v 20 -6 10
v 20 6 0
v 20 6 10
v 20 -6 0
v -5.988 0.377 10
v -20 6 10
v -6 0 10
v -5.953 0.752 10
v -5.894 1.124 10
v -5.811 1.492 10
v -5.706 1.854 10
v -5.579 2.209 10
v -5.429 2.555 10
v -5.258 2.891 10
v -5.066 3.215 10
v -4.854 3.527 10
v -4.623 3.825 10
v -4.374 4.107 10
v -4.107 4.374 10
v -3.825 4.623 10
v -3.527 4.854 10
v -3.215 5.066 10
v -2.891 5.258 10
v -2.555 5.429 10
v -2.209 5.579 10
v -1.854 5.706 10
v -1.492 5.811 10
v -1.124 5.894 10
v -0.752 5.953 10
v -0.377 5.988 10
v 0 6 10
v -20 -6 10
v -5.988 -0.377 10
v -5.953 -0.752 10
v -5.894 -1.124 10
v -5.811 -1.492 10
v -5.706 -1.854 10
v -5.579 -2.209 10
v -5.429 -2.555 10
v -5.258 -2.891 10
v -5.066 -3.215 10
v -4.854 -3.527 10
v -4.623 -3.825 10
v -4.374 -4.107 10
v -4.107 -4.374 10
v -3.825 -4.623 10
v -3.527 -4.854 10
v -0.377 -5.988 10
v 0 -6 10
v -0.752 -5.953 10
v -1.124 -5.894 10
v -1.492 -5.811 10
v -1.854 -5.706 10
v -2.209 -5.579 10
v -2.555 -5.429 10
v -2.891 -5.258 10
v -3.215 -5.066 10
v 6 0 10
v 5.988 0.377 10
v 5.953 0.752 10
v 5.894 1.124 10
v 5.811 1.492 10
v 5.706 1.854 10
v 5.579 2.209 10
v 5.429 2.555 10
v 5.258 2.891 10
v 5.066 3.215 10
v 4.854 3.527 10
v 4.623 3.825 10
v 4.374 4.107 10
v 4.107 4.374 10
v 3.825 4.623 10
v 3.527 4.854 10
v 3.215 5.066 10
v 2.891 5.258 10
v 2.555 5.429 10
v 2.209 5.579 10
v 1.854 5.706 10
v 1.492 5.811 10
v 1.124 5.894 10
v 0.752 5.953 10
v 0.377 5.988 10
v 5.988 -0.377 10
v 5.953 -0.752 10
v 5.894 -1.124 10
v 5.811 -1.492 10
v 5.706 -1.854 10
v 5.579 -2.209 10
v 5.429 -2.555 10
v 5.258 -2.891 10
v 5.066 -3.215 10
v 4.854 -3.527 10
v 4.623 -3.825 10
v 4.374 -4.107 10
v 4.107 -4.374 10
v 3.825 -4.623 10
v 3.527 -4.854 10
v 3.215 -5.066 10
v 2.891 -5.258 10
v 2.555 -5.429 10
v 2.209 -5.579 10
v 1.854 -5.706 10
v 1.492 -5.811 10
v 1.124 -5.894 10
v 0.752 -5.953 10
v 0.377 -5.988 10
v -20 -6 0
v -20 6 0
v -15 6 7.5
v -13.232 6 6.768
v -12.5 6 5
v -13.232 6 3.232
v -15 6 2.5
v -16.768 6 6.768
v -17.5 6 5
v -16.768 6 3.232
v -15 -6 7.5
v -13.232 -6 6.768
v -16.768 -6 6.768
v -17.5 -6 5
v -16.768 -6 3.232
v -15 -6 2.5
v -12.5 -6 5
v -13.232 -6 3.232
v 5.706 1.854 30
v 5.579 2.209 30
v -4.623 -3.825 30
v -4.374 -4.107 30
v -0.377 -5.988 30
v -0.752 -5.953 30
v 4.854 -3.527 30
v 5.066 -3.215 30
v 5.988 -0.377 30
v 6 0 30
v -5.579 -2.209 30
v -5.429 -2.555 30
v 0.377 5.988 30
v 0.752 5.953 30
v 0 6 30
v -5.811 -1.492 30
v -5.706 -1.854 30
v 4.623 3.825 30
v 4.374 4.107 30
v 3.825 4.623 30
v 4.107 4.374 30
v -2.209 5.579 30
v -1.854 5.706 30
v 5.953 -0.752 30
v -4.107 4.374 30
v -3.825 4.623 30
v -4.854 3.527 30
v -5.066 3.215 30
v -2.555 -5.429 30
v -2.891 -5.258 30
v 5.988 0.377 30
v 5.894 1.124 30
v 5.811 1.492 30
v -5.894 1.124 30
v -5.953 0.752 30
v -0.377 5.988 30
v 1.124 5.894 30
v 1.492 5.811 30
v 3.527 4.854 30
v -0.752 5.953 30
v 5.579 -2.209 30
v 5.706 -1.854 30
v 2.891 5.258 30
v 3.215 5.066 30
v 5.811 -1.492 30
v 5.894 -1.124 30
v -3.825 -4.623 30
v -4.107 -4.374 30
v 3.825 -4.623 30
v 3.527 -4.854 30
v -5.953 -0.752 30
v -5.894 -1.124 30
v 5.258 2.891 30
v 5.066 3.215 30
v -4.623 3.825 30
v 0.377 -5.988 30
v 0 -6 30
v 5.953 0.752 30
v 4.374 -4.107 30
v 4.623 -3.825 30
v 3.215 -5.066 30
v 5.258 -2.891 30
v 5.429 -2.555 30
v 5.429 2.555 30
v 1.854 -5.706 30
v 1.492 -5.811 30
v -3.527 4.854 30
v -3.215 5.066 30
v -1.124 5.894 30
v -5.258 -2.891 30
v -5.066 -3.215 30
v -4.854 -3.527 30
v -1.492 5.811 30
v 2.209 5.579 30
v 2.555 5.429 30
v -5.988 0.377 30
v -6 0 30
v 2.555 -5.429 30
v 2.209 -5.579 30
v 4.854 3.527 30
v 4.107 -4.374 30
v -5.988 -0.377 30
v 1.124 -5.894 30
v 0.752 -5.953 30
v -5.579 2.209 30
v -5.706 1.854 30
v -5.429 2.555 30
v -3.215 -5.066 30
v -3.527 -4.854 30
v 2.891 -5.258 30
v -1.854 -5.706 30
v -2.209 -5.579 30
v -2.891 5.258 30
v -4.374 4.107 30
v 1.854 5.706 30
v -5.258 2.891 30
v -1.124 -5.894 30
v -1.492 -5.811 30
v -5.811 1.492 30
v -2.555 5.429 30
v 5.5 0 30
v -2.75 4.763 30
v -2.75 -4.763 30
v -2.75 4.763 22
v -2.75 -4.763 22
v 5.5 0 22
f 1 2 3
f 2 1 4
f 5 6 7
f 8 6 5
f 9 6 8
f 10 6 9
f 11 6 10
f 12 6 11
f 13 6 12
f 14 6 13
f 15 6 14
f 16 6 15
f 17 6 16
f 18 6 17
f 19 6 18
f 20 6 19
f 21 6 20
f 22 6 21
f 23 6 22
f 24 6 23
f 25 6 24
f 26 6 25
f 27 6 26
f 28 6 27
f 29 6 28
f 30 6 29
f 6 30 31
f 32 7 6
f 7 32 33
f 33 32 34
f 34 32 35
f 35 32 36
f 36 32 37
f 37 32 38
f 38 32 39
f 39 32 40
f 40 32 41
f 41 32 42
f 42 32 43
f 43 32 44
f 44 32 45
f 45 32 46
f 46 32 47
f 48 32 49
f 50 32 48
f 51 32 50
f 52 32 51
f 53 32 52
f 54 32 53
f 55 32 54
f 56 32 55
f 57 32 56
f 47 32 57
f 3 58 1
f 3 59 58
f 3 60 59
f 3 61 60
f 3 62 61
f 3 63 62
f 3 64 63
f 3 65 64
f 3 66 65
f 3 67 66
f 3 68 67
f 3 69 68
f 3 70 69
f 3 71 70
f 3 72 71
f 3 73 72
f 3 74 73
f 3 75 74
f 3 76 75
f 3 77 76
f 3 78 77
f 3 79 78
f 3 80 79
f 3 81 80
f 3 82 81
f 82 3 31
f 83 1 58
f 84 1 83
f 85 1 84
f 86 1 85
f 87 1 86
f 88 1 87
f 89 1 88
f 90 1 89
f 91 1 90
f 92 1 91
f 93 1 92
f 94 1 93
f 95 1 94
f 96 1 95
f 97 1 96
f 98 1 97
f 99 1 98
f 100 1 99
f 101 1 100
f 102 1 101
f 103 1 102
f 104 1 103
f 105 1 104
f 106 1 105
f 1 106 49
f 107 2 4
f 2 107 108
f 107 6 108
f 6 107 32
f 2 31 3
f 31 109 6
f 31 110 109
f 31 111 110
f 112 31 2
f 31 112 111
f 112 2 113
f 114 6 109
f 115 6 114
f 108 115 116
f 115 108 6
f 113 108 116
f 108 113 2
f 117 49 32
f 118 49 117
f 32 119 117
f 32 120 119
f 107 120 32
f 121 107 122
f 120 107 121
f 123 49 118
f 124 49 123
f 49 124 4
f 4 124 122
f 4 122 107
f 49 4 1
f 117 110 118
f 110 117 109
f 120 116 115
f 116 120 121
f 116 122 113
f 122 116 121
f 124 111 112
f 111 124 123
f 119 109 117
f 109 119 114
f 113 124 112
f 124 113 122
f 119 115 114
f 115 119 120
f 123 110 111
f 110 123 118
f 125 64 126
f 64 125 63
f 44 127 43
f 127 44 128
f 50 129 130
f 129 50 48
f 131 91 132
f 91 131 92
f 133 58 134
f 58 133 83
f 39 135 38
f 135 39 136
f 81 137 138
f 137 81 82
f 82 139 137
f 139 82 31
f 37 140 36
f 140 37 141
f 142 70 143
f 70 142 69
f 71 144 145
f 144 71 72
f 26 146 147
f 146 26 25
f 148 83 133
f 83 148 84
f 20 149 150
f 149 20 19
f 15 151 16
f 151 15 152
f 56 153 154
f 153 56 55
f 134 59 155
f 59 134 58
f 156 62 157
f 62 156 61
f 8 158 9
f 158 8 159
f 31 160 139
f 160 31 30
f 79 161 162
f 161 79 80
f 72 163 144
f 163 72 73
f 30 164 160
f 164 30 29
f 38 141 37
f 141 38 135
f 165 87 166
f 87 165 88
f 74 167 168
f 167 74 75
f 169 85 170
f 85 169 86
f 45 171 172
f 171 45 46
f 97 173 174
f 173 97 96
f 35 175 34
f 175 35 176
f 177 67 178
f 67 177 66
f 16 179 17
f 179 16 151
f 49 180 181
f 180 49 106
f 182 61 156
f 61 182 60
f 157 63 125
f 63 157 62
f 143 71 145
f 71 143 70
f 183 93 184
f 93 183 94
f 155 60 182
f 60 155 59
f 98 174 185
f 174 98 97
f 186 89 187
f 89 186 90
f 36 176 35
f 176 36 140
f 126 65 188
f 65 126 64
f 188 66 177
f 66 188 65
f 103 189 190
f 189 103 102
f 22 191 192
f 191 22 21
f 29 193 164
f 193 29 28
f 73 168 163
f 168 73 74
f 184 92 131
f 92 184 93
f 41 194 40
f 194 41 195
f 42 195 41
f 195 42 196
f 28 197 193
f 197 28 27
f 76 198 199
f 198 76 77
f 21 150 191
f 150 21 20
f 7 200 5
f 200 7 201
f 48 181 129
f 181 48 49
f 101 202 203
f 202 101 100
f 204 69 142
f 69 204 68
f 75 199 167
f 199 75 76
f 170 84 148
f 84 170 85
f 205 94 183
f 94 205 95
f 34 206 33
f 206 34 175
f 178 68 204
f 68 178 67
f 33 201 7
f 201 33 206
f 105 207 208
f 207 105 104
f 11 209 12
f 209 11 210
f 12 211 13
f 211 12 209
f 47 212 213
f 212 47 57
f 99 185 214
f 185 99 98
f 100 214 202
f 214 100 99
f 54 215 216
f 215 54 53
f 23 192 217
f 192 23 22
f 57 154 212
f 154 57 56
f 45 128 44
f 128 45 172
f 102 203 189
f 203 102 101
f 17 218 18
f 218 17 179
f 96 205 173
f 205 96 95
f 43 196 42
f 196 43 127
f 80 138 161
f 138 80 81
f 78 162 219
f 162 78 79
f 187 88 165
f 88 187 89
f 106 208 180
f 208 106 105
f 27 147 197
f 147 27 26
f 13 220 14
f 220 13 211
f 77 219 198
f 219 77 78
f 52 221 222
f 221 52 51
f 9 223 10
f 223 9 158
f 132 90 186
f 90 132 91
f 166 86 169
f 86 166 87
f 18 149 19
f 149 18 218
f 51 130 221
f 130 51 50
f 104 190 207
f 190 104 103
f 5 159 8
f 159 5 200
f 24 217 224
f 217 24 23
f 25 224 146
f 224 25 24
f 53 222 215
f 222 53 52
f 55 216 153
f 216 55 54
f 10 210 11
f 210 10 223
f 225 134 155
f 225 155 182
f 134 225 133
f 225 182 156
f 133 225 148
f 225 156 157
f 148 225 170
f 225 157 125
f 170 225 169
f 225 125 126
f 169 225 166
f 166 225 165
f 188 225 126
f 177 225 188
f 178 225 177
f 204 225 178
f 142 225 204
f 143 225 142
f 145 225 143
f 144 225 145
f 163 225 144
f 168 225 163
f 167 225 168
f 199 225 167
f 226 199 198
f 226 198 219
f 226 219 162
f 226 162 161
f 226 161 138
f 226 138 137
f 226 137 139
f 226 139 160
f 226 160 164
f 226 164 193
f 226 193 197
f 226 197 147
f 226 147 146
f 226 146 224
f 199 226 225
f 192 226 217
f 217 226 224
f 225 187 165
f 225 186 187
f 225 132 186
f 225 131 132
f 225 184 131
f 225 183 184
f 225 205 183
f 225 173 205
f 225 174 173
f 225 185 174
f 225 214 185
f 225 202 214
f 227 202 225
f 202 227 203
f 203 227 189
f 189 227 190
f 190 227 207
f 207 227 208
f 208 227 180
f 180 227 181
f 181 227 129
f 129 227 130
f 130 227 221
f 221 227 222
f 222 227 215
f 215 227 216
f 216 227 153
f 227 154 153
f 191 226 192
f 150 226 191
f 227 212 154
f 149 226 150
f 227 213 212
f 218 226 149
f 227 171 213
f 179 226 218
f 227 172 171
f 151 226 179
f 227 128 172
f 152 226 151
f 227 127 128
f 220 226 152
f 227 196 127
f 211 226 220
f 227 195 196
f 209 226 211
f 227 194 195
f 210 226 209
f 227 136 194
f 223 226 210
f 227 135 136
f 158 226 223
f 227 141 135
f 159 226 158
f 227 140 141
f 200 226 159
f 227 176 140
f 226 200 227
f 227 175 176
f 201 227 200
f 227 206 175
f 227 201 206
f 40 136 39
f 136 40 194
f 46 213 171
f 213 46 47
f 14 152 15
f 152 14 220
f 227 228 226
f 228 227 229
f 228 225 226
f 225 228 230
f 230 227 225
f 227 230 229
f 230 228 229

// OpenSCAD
/* 
 * Special key generator
 * All units are in milimeters
 *
 * author R. A. - 2015/12/08
 * e-mail: thingiverse@dexter.sk
 * Thingiverse username: dexterko
 *
 * Feel free to modify and distribute, but please keep the credits;-)
 */

outer_diameter=12;
inner_diameter=11;
height_of_shank=20; 
number_of_center_sides=3;
depth_of_center_hole=8;

union() {
    // key bow
    difference() {
        translate([-20, 0-(outer_diameter/2), 0])
        cube([40,outer_diameter,10]);
        
        //a hole in the bow
        rotate([0, 90, 90])
        translate([-5,15,-20])
        cylinder(r=2.5, h=40);
    }

    // Shank
    difference() {
        translate([0, 0, 10])
        cylinder(d=outer_diameter, h=height_of_shank, $fn=100);

        translate([0,0, 10+height_of_shank-depth_of_center_hole])
        cylinder(d=inner_diameter, h=depth_of_center_hole+1, $fn=number_of_center_sides);
    
    
    }

}
